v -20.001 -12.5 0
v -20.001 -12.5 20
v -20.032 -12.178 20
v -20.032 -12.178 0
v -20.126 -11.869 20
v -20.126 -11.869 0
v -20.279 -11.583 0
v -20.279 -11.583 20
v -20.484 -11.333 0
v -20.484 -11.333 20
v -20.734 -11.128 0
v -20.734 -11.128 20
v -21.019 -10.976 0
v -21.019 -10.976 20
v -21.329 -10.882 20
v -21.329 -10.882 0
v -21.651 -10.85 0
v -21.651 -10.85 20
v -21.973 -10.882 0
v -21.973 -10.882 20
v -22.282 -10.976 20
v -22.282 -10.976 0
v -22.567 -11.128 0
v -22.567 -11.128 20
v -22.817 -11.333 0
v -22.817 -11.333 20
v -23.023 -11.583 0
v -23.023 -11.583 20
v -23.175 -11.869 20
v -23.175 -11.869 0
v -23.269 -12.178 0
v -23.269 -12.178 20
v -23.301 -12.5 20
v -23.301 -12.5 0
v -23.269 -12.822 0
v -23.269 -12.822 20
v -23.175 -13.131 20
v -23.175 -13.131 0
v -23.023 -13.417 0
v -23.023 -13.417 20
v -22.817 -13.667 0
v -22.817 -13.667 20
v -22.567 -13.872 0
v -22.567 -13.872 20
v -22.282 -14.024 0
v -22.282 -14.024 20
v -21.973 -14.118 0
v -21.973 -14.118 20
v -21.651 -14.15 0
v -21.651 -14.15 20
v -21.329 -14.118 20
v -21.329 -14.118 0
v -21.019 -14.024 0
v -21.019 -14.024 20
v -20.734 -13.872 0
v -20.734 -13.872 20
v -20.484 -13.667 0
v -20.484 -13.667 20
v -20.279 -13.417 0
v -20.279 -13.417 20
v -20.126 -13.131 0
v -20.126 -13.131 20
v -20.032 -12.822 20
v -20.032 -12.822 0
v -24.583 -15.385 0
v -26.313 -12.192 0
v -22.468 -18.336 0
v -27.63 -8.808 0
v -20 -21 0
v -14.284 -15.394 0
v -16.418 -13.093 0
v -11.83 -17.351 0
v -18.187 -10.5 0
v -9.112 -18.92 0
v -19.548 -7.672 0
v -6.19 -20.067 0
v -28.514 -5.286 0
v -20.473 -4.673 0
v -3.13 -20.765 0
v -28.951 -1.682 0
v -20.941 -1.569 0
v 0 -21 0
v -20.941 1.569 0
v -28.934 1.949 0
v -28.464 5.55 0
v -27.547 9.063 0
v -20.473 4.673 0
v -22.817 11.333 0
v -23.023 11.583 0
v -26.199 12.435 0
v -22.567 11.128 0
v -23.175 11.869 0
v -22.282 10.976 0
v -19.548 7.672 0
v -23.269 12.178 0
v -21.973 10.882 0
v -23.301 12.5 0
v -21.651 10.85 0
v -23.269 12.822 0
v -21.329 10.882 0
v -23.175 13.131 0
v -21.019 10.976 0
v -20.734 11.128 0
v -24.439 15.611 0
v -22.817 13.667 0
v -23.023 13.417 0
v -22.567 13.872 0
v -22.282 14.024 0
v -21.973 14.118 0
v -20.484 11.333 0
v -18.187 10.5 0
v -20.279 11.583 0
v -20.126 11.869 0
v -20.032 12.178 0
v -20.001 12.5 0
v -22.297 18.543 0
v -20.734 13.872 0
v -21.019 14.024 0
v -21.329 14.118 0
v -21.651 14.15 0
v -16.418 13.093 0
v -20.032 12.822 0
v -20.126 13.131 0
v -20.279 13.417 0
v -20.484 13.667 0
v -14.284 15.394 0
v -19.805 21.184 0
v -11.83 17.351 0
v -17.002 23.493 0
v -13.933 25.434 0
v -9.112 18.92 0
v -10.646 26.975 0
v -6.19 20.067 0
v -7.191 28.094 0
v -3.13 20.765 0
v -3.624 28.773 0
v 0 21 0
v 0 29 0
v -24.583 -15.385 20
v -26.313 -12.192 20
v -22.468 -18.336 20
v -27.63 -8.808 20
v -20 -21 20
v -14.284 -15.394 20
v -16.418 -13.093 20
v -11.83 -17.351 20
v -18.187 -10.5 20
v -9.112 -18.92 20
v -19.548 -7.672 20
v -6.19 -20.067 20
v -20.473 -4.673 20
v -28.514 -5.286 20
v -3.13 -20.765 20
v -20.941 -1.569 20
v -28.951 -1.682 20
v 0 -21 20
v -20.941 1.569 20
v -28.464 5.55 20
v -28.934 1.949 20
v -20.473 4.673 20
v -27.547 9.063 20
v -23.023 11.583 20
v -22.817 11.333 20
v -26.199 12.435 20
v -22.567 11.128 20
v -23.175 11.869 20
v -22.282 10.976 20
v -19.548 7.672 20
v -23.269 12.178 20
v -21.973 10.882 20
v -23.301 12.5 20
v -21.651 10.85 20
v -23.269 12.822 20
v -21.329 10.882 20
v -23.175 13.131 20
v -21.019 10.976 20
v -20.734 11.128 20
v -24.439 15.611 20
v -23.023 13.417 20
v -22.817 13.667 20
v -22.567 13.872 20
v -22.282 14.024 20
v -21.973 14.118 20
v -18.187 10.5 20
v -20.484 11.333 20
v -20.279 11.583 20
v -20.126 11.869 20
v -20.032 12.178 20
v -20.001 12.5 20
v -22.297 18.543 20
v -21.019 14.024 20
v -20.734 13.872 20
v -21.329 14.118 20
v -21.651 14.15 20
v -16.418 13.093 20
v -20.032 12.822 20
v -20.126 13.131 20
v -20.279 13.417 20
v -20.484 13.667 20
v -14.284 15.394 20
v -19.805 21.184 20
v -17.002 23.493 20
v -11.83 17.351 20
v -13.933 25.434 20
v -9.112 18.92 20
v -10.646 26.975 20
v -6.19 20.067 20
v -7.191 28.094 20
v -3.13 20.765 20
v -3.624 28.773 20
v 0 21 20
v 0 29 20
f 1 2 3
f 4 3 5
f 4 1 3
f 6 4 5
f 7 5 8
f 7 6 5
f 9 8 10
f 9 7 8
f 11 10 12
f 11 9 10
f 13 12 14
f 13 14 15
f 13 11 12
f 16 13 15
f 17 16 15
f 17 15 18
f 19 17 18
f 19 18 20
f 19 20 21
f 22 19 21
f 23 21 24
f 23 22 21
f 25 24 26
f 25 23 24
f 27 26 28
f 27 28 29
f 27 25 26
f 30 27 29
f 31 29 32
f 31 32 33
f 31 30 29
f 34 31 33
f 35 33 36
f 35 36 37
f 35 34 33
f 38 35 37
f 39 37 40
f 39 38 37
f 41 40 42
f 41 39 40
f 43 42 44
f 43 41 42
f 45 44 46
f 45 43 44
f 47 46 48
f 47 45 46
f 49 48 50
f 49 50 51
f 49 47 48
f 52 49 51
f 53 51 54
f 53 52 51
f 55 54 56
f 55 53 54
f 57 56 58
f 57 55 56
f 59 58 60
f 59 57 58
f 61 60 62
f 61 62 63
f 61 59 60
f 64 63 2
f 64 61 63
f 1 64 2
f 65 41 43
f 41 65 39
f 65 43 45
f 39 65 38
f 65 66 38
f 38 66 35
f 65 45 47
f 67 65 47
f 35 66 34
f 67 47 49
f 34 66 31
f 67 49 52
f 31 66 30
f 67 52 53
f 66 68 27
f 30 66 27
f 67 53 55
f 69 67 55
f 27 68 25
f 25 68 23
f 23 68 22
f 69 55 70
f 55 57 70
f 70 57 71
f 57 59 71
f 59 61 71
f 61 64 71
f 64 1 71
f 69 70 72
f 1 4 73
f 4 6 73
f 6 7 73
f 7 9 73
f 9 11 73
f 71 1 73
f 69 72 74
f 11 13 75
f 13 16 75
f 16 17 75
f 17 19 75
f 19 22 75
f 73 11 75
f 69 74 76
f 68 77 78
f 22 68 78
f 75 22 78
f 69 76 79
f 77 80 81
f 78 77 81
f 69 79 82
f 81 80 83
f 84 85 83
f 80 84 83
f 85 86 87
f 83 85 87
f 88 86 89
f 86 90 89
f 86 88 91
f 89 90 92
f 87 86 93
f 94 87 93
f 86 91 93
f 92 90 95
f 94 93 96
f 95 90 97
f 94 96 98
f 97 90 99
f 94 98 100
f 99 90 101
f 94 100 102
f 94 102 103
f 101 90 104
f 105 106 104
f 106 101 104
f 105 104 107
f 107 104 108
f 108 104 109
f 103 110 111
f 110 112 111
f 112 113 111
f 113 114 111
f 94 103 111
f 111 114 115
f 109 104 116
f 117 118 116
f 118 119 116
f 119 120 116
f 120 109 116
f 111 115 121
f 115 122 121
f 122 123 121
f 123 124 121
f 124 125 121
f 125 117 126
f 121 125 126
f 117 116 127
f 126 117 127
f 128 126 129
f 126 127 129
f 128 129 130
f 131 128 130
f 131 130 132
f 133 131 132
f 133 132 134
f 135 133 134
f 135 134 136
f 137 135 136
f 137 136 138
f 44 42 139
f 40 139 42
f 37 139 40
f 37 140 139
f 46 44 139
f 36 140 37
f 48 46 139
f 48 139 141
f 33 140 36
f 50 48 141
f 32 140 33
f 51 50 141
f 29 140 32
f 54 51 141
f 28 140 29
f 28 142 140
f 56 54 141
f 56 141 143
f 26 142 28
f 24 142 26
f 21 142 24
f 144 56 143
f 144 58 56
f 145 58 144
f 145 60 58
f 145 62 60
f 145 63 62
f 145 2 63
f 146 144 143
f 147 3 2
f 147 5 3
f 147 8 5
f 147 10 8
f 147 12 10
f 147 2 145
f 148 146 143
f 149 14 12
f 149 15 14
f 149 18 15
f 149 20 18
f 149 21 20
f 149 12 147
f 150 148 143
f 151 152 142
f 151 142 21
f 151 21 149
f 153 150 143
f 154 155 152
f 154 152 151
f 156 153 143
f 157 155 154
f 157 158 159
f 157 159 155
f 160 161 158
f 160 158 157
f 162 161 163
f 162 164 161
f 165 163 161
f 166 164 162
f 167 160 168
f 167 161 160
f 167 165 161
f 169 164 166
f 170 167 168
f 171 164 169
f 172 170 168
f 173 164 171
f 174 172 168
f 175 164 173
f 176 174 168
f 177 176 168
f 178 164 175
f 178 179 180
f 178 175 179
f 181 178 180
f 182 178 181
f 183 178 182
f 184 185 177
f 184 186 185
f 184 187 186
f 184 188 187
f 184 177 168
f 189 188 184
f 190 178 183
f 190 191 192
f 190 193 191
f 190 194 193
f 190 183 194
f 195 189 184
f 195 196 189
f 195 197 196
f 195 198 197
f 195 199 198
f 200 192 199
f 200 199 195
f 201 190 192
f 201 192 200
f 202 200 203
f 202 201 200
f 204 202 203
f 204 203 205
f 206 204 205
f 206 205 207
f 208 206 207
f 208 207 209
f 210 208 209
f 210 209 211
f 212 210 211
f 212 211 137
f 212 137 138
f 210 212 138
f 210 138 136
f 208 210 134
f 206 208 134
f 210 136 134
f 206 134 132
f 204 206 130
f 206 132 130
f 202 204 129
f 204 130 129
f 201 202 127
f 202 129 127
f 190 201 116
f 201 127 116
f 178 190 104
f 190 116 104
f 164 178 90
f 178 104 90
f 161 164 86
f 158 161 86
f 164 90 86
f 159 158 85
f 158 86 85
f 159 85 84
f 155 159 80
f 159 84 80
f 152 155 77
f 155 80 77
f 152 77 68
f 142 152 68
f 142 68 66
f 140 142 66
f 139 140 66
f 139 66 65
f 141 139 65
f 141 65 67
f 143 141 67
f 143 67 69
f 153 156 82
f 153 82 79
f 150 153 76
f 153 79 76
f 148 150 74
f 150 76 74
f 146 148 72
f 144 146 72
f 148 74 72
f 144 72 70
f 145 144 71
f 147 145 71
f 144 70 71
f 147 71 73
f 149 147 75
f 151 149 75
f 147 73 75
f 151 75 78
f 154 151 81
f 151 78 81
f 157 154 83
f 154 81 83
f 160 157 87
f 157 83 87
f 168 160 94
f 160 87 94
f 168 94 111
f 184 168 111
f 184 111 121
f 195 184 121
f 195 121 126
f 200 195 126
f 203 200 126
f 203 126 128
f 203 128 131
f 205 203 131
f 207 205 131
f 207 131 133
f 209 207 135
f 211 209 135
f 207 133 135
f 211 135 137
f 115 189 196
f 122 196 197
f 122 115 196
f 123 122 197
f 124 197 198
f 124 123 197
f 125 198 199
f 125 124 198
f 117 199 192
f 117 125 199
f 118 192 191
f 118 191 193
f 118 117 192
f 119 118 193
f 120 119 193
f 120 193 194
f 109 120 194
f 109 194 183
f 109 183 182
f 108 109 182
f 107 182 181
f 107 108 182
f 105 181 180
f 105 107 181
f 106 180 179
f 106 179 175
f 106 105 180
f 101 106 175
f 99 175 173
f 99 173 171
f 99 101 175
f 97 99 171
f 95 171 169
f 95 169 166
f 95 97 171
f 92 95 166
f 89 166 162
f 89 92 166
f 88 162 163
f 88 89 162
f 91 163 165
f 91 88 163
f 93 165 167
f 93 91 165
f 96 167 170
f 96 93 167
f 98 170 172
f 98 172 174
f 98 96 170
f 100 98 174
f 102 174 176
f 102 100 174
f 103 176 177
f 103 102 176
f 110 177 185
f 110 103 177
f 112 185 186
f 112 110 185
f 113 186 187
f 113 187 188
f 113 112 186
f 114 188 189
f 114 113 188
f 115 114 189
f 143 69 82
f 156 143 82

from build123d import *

# Parameters (mm, degrees)
EXTRUDE_2_DEPTH         = 20
SKETCH_3_R              = 1.65
CUT_EXTRUDE_2_DEPTH     = 20
DELETE_FACE_1_OUTLINE_R = 1.65
DELETE_FACE_1_DEPTH     = 20


# Read off the part's stored shape, not the designer's step: 删除面1
with BuildPart() as part:
    # 草图1 → 凸台-拉伸2 (new body)
    with BuildSketch(Plane.XY):
        with BuildLine():
            Line((-20, -21), (0, -21))
            ThreePointArc((0, -21), (-21, 0), (0, 21))
            Line((0, 21), (0, 29))
            ThreePointArc((0, 29), (-26.925824036, 10.770329614), (-20, -21))
        make_face()
    extrude(amount=EXTRUDE_2_DEPTH)

    # 草图3 → 切除-拉伸2 (cut)
    with BuildSketch(Plane.XY):
        with Locations((-12.5, 21.650635095)):
            Circle(SKETCH_3_R)
        with Locations((-21.650635095, 12.5)):
            Circle(SKETCH_3_R)
        with Locations((-21.650635095, -12.5)):
            Circle(SKETCH_3_R)
    extrude(amount=CUT_EXTRUDE_2_DEPTH, mode=Mode.SUBTRACT)

    # Delete Face 1 outline → Delete Face 1 (add)
    with BuildSketch(Plane.XY):
        with Locations((-12.5, 21.650635095)):
            Circle(DELETE_FACE_1_OUTLINE_R)
    extrude(amount=DELETE_FACE_1_DEPTH)


solid = part.part
